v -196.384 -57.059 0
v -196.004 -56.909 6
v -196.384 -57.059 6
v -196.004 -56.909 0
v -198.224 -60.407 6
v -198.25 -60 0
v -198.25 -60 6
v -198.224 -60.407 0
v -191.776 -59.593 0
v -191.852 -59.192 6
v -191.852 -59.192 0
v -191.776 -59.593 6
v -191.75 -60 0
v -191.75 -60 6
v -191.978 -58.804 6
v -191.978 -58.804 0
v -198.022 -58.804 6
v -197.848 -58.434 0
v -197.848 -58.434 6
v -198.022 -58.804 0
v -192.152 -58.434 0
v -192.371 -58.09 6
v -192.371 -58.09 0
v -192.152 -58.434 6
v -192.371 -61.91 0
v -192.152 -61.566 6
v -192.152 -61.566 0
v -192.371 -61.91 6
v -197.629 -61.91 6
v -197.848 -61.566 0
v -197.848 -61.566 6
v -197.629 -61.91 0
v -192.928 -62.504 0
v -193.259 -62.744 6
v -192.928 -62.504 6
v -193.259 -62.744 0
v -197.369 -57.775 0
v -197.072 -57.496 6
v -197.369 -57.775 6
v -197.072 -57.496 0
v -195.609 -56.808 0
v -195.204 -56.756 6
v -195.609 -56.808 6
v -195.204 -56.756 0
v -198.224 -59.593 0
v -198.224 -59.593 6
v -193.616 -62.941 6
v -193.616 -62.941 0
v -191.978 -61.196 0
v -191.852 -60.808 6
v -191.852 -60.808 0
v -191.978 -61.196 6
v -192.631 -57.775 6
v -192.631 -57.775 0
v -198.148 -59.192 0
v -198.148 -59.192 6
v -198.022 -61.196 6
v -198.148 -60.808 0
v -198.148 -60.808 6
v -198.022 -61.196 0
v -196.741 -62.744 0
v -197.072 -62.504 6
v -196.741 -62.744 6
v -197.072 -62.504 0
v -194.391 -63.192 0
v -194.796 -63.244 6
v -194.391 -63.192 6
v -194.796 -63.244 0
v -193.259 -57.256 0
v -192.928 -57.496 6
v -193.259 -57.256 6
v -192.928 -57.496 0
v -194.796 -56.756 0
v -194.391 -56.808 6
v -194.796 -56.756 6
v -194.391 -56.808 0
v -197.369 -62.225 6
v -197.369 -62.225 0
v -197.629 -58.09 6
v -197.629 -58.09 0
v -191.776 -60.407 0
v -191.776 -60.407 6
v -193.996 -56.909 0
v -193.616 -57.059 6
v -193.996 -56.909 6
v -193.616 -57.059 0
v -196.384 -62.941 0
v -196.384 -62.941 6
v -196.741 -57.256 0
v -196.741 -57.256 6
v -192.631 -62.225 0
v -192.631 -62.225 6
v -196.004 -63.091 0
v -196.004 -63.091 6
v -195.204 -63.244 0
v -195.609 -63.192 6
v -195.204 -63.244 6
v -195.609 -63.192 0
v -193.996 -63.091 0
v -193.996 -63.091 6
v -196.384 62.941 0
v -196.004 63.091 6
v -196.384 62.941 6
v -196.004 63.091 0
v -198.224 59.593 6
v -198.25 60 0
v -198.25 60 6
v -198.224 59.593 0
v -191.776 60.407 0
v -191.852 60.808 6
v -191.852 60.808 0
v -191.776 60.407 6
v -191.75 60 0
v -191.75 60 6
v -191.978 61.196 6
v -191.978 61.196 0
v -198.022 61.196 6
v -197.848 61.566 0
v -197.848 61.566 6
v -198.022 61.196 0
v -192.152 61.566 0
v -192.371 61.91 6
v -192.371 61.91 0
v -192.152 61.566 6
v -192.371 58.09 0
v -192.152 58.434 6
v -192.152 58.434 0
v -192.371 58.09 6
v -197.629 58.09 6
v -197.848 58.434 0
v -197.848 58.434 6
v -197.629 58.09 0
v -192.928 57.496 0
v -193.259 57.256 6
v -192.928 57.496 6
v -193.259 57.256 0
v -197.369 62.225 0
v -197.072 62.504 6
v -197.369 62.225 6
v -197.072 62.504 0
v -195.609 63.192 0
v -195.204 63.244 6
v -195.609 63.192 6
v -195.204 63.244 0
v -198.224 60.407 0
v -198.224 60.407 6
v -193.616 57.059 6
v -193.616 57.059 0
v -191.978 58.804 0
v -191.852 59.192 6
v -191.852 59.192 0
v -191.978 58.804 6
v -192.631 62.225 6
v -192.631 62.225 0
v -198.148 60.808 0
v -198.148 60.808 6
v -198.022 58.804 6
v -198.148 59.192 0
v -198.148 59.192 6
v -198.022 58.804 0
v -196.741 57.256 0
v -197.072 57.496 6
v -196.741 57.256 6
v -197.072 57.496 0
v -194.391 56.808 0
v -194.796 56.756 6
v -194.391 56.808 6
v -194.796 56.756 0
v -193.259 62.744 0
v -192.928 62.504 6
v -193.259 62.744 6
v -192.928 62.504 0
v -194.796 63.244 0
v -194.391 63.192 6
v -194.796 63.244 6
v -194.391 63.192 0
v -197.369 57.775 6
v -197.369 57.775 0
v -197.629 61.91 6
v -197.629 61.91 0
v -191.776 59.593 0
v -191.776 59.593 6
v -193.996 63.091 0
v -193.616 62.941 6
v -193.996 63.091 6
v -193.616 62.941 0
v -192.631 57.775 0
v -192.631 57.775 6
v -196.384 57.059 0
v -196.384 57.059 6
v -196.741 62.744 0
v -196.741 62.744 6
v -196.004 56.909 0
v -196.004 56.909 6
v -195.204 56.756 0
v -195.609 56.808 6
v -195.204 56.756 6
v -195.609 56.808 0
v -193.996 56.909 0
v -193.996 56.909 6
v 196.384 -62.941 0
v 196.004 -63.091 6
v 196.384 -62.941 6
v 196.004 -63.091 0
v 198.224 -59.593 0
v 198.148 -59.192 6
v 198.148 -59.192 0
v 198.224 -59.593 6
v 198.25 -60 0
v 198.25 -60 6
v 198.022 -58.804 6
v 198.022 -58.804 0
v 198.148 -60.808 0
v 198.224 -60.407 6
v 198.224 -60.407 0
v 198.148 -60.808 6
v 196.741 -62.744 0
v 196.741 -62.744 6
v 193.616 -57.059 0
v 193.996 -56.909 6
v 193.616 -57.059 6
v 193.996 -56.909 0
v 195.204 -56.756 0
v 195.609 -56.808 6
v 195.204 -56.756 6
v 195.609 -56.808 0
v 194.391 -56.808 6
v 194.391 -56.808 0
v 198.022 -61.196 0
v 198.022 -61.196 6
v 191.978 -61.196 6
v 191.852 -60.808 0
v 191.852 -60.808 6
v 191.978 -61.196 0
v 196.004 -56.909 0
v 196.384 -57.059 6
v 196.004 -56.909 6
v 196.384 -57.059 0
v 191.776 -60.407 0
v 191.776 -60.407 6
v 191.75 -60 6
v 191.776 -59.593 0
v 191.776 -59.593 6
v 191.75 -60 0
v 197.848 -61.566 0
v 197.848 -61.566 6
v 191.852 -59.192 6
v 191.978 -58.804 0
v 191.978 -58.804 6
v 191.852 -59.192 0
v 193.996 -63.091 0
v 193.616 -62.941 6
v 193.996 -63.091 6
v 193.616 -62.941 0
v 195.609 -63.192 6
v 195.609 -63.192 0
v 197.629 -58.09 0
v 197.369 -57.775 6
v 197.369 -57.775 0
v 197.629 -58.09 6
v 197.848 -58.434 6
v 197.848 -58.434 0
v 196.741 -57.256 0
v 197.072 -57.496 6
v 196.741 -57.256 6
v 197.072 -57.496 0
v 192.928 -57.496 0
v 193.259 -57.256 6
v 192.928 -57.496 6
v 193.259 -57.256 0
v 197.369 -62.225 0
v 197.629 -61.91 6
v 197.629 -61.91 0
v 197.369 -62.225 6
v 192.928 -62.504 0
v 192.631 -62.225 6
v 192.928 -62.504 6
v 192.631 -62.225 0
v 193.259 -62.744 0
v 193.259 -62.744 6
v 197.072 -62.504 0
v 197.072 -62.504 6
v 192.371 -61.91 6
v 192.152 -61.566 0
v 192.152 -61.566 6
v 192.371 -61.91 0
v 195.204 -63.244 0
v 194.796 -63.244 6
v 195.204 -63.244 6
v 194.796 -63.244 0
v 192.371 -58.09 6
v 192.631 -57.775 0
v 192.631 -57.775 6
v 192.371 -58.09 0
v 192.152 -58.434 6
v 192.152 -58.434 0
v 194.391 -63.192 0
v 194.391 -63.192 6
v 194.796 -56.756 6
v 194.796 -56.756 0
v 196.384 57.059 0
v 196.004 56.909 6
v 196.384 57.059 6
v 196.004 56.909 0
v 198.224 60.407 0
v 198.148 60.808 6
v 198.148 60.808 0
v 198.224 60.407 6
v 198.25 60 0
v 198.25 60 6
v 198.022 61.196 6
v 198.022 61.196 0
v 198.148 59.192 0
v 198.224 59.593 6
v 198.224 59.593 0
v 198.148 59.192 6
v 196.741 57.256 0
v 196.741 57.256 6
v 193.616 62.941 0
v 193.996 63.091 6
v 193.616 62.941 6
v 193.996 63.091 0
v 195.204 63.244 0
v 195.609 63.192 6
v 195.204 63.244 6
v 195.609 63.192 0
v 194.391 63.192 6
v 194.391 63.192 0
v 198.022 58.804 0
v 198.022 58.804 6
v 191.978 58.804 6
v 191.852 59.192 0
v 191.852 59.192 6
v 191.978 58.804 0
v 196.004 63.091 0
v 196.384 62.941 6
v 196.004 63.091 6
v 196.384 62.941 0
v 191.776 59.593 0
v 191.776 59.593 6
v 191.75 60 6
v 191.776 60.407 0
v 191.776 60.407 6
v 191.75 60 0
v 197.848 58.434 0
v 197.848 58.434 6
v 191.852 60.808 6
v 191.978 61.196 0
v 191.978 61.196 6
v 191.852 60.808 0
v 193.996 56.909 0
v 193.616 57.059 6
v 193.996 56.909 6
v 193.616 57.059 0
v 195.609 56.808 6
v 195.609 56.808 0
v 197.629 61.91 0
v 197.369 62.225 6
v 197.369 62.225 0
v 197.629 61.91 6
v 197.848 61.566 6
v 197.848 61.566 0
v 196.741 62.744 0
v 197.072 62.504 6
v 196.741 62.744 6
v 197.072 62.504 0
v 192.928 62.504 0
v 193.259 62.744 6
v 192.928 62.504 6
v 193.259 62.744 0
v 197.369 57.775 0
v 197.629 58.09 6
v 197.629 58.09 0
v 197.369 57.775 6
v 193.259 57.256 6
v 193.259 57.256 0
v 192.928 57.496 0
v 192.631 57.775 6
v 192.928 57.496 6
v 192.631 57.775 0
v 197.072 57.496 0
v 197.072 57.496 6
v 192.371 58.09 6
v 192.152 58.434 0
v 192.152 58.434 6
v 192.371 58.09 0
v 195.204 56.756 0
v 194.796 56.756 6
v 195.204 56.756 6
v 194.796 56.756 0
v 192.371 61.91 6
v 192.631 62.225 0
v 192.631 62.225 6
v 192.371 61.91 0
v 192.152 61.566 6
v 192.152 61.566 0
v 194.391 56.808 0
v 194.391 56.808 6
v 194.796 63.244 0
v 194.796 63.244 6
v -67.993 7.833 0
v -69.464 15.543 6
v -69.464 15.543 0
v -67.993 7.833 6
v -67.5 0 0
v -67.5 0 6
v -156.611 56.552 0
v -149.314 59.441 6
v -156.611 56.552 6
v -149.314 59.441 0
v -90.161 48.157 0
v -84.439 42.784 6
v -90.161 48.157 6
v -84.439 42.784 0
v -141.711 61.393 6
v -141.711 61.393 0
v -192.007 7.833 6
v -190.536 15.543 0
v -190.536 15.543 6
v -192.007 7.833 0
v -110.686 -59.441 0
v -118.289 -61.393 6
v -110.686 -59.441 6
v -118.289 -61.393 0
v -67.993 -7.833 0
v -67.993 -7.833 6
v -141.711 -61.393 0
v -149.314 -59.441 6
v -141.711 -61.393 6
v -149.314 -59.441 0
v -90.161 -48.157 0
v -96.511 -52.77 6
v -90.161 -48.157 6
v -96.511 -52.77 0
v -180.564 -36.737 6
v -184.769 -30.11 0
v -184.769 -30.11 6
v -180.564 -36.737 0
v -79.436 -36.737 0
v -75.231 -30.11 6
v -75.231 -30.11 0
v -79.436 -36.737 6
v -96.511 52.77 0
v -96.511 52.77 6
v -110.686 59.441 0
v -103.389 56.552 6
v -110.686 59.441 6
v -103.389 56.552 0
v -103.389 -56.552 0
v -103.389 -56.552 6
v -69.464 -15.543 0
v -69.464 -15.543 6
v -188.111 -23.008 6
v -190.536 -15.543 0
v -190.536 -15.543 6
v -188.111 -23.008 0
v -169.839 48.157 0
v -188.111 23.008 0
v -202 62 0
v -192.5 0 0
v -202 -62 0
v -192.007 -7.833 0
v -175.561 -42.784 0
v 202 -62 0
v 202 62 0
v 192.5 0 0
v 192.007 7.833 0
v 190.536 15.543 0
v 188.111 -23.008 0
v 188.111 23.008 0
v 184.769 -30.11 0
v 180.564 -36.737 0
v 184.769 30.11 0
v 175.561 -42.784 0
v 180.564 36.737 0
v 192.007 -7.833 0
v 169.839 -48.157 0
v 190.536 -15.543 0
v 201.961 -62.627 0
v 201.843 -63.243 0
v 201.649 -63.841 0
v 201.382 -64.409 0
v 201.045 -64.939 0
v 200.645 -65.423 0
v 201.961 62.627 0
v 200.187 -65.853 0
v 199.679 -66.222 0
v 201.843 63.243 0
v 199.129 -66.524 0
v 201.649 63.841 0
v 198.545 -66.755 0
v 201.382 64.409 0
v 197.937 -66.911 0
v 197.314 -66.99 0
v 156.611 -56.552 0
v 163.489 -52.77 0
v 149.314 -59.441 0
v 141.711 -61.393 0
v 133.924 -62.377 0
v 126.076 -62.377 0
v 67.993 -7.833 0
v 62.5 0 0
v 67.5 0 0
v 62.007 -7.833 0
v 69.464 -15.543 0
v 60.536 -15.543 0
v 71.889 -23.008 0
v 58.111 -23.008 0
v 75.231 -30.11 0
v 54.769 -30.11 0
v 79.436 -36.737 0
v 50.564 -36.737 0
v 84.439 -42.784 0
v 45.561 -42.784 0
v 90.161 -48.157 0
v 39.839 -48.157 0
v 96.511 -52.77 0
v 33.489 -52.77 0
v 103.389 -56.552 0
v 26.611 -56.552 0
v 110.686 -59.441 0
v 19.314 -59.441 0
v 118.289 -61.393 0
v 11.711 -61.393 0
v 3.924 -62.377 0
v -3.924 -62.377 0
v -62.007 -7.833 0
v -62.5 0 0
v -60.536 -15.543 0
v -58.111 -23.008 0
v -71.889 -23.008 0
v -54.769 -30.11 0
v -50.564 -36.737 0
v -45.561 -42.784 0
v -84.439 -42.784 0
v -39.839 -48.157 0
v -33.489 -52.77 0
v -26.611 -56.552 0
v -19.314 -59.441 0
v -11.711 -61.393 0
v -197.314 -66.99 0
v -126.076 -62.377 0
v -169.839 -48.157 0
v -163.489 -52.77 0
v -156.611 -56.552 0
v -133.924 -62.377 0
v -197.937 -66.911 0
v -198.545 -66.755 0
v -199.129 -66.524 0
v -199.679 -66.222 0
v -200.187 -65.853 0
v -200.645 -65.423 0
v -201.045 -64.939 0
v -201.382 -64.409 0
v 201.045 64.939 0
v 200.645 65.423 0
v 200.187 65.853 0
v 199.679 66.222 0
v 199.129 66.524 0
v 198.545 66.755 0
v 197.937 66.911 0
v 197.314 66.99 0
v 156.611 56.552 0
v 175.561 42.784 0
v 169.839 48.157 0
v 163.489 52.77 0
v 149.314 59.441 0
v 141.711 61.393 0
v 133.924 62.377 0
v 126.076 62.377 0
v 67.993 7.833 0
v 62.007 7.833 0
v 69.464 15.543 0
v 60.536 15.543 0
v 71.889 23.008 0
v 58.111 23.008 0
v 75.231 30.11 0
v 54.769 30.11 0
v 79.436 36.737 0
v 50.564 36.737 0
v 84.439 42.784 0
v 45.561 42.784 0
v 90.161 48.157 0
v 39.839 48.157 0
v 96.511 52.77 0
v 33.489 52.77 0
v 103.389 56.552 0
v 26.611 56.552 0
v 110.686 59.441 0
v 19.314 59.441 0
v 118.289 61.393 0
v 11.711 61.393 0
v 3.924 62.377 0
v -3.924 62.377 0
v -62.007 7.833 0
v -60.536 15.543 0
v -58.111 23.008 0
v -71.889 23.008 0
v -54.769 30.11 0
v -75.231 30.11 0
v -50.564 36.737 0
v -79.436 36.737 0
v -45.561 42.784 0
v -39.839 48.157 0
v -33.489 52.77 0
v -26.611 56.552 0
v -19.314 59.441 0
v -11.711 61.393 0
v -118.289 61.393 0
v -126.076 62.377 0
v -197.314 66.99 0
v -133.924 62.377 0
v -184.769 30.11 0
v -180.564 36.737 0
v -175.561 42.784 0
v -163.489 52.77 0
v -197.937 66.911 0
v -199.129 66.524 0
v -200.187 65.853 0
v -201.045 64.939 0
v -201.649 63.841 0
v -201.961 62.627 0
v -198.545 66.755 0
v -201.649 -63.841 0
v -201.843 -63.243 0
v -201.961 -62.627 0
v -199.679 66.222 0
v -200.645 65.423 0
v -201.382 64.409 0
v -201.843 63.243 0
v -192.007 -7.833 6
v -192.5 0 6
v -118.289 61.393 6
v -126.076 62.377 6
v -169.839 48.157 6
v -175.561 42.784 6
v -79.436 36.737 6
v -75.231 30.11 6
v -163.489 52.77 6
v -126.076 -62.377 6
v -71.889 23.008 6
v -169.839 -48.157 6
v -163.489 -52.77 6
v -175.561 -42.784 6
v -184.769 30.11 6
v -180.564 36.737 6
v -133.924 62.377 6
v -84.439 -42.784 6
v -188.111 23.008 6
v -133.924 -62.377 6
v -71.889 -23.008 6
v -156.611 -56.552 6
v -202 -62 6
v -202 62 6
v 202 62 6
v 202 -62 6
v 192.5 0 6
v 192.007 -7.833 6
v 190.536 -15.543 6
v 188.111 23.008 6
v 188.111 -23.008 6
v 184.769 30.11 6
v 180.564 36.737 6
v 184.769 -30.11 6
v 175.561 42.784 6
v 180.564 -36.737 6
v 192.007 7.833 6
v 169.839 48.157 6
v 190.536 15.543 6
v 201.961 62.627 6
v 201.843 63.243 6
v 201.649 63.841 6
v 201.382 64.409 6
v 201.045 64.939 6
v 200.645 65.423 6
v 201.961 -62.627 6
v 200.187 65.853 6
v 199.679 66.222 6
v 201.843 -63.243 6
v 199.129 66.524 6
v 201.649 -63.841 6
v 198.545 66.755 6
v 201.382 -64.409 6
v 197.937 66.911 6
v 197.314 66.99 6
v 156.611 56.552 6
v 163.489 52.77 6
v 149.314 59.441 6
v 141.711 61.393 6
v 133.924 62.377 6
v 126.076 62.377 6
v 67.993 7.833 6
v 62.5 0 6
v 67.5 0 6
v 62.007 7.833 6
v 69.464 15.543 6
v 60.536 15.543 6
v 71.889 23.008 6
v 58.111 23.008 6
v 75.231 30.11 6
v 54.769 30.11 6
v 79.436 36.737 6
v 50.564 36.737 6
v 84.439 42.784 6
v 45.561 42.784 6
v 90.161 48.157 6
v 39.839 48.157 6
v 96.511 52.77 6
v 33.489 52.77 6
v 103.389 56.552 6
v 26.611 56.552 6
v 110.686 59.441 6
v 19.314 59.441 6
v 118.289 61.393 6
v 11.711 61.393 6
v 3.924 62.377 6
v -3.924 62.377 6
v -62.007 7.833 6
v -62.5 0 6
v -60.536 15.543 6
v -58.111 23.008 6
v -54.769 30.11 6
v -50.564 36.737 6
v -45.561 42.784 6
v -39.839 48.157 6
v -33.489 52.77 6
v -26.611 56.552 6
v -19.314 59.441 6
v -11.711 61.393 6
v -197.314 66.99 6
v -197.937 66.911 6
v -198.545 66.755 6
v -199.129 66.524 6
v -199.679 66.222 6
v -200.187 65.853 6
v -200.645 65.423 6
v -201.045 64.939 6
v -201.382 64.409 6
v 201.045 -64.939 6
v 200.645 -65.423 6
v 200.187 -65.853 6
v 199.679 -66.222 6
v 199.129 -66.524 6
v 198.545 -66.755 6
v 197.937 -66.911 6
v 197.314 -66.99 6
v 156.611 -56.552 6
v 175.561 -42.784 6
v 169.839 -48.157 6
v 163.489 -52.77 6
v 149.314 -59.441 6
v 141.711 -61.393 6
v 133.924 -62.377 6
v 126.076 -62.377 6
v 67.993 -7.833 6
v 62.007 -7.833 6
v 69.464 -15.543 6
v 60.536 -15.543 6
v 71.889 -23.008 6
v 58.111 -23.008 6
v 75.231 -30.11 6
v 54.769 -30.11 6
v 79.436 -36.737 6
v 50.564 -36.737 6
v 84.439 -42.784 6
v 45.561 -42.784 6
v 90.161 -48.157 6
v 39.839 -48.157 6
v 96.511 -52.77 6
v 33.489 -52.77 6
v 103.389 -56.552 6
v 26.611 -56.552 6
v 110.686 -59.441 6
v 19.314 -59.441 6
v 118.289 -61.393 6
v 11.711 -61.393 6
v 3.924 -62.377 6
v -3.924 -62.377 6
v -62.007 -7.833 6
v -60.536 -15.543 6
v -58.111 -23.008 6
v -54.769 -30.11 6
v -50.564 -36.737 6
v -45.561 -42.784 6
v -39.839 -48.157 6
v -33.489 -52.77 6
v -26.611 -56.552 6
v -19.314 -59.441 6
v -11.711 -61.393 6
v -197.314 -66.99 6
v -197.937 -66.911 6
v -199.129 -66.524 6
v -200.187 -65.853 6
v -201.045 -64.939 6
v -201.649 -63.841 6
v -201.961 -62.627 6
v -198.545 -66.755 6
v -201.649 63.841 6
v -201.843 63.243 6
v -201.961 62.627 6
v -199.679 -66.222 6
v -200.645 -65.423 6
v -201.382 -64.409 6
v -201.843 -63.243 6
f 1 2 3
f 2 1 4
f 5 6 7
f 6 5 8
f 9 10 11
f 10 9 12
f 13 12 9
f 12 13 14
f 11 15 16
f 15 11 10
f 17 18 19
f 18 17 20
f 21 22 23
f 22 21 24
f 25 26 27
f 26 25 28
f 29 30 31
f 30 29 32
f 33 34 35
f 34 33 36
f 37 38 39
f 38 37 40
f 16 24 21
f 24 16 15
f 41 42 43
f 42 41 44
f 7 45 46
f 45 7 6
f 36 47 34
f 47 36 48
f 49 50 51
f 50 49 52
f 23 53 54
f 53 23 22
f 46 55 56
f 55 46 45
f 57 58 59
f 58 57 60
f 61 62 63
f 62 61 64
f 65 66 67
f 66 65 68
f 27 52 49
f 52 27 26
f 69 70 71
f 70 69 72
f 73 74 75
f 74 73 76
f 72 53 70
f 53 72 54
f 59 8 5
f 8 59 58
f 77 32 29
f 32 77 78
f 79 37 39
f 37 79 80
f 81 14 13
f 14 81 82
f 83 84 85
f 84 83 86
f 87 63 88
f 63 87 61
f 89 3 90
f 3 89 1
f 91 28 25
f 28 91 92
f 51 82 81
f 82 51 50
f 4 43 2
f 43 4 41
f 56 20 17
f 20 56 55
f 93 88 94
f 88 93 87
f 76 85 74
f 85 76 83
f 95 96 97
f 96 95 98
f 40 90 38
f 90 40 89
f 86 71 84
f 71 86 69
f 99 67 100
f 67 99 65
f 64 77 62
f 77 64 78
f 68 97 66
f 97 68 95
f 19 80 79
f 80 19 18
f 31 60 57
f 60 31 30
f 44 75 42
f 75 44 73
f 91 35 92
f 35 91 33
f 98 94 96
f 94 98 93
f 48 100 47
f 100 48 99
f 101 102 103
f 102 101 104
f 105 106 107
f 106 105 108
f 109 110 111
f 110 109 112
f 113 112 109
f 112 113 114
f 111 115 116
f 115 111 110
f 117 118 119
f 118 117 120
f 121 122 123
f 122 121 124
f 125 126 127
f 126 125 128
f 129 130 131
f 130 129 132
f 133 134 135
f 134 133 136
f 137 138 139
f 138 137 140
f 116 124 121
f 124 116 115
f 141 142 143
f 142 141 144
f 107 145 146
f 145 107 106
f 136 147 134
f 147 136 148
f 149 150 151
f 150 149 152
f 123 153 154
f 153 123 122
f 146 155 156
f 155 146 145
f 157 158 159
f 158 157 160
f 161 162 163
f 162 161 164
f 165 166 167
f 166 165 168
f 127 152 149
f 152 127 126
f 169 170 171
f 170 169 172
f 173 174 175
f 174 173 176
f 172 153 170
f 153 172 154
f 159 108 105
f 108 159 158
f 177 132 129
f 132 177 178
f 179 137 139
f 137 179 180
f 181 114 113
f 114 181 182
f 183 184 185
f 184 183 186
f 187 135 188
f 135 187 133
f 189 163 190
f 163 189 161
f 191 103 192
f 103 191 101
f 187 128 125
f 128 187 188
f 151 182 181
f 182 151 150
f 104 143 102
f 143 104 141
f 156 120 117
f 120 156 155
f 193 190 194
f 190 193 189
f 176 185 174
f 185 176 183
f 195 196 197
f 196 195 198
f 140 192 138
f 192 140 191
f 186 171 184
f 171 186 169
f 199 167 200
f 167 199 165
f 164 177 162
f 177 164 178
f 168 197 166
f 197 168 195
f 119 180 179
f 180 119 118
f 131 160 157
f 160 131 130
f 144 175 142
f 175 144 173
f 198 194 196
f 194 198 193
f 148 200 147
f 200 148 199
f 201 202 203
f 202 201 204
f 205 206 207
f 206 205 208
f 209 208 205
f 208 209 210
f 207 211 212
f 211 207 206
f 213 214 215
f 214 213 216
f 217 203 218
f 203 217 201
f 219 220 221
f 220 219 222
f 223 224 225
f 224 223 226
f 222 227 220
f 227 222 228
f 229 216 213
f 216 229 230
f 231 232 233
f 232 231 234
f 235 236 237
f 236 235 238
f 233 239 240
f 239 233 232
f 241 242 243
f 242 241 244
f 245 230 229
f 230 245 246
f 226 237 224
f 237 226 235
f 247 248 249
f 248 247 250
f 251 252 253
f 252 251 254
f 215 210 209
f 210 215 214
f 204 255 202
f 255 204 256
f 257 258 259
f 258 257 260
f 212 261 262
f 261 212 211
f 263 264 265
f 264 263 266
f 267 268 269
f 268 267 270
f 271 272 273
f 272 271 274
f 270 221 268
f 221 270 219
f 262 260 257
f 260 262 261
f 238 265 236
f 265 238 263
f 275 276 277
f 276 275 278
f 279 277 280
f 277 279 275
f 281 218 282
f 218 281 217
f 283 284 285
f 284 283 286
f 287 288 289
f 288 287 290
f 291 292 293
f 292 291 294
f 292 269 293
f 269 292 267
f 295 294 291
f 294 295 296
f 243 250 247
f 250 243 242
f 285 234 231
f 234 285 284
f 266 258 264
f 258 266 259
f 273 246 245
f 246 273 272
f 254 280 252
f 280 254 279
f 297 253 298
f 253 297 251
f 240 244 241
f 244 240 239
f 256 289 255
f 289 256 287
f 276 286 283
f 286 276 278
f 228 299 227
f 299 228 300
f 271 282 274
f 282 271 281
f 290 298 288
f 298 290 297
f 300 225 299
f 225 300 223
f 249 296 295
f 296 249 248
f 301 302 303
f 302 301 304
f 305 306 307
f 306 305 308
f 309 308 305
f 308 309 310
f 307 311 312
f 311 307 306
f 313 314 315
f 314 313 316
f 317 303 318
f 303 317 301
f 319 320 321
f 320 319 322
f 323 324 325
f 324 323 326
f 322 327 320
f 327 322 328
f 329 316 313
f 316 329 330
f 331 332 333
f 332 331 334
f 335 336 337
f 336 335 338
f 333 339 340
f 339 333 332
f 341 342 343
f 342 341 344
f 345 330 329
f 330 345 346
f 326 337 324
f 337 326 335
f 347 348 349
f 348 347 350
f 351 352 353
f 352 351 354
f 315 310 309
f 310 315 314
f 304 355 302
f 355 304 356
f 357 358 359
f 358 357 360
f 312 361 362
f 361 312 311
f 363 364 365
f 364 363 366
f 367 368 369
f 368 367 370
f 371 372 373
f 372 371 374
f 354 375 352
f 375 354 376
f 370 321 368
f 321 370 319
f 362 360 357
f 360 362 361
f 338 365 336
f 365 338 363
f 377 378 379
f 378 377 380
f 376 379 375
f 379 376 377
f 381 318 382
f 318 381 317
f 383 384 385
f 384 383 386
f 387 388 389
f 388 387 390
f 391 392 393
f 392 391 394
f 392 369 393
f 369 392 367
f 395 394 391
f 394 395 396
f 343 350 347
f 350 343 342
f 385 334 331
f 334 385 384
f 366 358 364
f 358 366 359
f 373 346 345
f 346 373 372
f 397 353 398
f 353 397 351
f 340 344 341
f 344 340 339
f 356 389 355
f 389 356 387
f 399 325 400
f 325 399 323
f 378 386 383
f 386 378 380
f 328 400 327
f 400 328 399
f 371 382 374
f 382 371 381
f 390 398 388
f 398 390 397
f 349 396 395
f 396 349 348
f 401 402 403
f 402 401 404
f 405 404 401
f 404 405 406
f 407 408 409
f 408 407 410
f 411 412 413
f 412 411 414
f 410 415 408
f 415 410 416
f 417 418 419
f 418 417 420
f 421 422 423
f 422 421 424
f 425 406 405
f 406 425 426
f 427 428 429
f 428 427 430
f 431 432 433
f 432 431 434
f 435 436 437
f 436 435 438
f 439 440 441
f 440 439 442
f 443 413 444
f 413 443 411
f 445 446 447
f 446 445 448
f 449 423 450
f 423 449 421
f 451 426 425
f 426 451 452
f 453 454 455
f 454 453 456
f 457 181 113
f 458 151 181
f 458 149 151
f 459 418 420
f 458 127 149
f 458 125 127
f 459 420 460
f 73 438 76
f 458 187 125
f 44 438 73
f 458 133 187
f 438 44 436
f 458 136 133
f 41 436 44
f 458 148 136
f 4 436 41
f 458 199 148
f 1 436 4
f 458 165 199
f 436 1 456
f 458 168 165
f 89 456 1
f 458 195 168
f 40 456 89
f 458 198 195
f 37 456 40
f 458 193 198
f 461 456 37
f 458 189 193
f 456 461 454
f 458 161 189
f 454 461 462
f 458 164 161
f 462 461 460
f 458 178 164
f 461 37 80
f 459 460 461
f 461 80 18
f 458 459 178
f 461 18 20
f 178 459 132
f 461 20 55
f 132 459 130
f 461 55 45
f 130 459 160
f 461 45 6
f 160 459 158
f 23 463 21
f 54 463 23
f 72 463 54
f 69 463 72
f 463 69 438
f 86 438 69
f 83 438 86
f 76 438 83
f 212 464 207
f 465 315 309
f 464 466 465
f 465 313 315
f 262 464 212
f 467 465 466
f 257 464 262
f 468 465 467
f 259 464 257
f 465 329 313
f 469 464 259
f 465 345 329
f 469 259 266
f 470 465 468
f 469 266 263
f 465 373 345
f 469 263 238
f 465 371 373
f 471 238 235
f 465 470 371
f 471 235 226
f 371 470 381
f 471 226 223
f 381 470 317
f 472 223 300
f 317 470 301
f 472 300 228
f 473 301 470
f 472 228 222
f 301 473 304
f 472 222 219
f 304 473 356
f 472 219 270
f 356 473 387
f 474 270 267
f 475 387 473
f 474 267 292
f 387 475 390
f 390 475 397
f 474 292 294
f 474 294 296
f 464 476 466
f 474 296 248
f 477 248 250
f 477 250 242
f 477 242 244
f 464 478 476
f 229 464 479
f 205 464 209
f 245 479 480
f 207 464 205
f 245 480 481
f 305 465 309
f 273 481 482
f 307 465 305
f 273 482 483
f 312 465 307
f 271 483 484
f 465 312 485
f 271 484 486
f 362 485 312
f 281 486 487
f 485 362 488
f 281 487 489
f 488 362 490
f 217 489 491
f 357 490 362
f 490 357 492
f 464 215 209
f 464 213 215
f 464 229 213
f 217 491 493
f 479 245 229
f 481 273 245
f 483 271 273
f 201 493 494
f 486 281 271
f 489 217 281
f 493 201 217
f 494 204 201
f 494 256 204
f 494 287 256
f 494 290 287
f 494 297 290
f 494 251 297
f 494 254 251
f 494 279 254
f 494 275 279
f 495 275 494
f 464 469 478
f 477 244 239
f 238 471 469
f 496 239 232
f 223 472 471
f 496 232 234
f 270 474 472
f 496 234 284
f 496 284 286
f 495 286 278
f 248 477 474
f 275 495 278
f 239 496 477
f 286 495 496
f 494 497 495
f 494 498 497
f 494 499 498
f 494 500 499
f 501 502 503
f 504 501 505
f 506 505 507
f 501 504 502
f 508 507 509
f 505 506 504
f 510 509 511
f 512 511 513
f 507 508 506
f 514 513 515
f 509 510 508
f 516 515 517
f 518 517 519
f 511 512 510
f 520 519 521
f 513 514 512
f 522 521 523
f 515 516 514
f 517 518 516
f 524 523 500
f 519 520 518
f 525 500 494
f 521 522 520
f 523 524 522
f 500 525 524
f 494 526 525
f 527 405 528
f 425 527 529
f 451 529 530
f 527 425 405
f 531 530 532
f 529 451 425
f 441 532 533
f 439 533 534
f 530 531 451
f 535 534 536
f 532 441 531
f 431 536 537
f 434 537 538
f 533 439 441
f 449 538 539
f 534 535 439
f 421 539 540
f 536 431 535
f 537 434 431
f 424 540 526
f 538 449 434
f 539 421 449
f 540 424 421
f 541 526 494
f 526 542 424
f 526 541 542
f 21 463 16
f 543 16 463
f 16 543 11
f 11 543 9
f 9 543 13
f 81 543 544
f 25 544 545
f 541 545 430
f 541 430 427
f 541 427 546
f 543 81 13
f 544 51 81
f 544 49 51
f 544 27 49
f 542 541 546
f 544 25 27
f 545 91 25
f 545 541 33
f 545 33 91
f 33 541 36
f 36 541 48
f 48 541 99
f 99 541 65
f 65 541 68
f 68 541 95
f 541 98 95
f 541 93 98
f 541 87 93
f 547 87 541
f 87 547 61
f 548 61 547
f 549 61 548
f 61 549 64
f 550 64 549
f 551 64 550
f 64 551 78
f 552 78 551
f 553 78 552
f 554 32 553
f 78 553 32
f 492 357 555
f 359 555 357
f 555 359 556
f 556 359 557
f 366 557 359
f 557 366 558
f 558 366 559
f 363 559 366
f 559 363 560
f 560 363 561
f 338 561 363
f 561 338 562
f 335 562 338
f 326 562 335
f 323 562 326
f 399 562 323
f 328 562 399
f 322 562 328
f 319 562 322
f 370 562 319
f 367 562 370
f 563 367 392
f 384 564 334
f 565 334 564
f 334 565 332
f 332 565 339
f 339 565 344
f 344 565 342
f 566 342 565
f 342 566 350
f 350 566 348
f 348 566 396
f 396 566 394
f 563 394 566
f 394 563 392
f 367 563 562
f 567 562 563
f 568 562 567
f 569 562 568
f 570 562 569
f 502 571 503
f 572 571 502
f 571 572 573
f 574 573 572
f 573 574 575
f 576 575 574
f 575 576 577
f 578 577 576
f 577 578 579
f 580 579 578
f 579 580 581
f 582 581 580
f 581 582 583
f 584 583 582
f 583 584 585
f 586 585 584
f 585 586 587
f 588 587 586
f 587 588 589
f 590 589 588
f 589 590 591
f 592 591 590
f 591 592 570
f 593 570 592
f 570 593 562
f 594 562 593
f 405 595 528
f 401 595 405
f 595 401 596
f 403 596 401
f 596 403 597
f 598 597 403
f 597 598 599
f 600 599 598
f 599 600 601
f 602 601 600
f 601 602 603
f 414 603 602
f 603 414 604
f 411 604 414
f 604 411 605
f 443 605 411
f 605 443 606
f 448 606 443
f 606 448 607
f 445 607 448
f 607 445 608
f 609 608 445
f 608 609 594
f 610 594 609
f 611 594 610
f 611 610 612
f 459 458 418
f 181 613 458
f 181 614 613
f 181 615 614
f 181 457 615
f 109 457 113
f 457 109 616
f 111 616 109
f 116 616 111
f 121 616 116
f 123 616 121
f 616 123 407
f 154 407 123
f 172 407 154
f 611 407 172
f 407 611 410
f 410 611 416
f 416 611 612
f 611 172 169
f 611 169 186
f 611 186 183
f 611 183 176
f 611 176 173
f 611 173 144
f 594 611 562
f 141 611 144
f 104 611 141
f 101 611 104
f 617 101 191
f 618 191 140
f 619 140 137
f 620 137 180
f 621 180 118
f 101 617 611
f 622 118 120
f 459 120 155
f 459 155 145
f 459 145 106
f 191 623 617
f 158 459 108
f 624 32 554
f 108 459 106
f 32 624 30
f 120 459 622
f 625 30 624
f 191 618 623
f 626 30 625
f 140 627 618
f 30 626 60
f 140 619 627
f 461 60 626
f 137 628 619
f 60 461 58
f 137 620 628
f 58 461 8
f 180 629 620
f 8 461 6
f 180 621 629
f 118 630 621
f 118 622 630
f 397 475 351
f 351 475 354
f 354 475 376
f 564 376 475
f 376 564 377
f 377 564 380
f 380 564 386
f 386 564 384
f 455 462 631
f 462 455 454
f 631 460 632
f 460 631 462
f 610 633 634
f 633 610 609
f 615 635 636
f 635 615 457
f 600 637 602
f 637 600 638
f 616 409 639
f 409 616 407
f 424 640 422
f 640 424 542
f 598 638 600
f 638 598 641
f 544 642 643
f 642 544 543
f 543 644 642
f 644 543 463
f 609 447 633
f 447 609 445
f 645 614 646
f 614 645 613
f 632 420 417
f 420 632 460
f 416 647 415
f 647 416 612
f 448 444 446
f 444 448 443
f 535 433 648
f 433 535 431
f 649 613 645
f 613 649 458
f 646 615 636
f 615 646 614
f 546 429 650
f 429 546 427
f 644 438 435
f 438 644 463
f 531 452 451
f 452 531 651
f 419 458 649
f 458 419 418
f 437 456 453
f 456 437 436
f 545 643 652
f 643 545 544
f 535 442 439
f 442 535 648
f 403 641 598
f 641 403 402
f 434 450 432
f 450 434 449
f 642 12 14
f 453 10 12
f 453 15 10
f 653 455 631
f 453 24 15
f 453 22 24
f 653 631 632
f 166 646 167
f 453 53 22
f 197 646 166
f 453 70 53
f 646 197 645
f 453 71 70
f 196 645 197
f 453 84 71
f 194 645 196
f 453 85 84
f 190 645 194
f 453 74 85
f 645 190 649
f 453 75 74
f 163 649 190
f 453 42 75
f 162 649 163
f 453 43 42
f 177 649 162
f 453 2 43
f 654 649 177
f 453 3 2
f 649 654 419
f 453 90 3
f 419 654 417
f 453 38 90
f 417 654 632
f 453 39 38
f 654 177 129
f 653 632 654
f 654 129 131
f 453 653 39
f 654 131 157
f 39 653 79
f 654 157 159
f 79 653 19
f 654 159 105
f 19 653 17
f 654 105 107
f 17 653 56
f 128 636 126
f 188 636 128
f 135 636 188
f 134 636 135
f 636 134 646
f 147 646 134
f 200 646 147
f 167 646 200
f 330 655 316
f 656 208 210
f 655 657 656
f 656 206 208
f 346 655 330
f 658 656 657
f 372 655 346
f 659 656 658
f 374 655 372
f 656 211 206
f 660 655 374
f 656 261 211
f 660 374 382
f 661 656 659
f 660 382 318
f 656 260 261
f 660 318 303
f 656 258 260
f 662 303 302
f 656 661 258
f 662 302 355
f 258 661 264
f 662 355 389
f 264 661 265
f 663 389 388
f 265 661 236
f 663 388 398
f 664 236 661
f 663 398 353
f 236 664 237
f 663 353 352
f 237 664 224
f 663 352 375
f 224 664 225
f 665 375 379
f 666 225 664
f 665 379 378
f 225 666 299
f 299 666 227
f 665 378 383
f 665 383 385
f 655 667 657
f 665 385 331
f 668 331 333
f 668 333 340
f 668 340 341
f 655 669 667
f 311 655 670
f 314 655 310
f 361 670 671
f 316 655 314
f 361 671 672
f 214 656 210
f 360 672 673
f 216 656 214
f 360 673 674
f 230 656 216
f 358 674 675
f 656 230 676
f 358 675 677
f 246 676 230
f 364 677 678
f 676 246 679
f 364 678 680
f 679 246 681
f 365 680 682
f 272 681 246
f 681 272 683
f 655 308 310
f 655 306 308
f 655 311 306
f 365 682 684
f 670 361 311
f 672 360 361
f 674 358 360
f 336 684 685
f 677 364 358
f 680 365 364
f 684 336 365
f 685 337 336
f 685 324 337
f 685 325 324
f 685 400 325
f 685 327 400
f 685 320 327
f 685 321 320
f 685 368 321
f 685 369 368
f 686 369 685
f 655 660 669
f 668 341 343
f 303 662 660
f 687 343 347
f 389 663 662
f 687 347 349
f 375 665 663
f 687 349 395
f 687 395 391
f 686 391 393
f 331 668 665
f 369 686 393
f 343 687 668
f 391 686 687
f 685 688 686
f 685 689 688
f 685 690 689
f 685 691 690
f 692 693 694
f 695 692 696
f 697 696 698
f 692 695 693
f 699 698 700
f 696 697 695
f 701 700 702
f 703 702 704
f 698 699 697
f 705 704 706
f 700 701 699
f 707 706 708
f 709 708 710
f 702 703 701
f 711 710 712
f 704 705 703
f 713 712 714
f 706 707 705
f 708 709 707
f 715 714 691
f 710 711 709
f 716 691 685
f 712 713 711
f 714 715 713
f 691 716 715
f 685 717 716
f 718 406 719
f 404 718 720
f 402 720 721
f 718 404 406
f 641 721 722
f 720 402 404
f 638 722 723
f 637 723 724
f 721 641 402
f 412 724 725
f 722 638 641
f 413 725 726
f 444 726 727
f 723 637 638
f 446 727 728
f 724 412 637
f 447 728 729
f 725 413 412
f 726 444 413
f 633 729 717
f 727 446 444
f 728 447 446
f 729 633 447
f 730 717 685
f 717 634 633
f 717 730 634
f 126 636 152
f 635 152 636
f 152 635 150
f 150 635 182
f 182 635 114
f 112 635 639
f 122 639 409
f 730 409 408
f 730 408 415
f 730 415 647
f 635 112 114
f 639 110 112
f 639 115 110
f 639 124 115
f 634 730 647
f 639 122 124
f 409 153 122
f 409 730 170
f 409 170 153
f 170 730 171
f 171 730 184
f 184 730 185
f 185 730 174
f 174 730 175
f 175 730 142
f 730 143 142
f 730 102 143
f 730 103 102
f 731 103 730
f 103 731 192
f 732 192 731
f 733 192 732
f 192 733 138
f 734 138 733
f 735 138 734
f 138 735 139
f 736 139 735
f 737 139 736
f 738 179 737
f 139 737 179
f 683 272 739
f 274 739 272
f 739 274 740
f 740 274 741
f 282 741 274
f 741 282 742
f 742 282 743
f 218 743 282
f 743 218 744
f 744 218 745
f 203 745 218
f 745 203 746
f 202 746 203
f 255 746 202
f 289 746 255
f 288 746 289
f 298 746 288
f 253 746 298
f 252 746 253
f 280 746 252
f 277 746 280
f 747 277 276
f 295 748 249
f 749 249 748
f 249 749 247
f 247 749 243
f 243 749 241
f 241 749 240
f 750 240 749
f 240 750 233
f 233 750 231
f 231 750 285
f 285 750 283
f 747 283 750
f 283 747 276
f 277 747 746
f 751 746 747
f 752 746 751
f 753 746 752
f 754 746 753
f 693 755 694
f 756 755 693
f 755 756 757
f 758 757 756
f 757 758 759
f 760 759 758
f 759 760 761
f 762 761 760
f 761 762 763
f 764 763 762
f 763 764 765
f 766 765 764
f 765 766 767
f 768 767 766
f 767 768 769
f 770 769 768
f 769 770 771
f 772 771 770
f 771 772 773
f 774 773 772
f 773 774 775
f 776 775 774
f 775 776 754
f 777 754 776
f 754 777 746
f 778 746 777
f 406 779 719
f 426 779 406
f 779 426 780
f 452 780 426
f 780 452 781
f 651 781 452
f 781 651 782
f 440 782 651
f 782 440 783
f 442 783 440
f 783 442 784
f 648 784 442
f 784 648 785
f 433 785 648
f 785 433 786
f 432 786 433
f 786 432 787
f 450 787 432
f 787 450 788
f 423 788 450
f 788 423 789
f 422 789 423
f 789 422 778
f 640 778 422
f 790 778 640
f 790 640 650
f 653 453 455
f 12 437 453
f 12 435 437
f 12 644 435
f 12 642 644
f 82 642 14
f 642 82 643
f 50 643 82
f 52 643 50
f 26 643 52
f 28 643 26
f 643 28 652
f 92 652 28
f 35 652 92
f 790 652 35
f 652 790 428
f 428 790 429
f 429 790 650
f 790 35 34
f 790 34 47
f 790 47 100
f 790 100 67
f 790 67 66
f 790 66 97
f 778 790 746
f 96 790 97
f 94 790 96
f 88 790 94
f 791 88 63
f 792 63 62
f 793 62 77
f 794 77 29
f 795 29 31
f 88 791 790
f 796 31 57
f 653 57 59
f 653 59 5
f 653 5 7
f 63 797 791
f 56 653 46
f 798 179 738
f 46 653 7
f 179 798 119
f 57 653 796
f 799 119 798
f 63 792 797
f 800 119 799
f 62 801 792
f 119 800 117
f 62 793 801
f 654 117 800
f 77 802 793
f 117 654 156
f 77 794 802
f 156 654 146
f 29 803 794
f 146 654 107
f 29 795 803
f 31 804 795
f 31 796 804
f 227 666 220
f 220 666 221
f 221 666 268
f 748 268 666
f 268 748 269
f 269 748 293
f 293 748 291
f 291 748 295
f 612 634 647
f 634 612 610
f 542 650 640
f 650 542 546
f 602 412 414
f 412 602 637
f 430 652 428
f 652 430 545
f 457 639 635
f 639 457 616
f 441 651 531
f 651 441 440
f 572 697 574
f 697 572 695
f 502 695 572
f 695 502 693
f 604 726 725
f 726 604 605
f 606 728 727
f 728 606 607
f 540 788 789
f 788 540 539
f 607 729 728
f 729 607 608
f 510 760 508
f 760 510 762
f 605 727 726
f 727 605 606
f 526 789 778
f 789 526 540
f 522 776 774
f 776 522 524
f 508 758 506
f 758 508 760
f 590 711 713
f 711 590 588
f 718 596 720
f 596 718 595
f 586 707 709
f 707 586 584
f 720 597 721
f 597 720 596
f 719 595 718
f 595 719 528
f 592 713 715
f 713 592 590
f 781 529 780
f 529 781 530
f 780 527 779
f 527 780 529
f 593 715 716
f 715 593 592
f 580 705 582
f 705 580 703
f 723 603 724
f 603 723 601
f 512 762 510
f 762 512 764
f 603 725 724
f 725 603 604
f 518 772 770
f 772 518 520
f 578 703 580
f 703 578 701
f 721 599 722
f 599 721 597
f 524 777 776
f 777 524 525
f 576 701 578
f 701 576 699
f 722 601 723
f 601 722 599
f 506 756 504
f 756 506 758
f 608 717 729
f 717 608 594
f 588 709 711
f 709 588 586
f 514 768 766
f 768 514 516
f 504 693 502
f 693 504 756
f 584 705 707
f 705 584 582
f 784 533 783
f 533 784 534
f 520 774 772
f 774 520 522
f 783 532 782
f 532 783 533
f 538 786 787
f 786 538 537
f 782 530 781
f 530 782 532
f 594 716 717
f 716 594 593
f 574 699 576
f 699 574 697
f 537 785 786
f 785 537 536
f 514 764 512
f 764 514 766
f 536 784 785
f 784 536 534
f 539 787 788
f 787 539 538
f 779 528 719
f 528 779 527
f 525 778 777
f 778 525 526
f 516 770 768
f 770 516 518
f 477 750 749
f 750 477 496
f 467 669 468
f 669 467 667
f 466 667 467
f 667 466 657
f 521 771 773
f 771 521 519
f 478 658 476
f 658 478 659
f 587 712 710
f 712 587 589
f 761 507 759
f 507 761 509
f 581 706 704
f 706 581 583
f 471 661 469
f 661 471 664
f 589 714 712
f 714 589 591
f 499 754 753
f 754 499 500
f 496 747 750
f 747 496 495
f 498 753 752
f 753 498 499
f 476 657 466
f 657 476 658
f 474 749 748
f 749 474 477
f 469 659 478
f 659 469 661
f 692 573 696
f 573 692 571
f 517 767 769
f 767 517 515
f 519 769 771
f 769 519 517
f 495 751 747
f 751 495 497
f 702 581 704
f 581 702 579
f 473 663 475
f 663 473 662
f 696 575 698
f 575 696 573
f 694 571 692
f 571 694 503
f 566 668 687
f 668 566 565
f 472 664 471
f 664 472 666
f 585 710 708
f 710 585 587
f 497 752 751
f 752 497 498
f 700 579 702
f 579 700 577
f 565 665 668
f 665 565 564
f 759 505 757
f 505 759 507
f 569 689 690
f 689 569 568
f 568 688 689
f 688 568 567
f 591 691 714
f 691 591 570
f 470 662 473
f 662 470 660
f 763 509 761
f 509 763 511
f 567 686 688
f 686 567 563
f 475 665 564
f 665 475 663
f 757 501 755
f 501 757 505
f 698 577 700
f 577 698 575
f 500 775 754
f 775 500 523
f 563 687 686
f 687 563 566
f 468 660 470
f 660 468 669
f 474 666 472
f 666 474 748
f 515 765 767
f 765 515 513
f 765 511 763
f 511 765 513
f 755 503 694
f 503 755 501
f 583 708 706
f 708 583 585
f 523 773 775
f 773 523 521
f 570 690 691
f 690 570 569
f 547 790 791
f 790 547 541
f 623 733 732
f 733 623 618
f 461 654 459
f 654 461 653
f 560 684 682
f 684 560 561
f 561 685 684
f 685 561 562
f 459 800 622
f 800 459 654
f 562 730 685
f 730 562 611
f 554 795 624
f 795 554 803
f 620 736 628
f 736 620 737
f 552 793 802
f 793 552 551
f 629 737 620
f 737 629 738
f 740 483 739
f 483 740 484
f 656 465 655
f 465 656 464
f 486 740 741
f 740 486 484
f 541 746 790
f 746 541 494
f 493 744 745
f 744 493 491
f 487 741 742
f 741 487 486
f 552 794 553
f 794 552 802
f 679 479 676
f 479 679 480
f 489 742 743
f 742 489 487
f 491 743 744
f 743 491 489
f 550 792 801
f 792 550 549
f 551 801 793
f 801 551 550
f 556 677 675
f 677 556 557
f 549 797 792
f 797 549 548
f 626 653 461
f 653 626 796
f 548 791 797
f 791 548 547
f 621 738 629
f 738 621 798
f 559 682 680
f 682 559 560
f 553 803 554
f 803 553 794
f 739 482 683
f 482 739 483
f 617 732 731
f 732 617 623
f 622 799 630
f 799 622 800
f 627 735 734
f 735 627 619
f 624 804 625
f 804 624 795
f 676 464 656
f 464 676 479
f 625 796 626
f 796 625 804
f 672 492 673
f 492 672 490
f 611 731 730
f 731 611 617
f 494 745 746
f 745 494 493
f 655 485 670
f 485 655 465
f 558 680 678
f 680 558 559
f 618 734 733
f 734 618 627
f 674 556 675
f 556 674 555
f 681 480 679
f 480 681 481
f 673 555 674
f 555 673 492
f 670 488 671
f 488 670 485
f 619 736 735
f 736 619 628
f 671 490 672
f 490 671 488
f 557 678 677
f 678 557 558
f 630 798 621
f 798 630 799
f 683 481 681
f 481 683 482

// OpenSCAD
$fn = 50;


difference() {
	union() {
		hull() {
			translate(v = [-197.0000000000, 62.0000000000, 0]) {
				cylinder(h = 6, r = 5);
			}
			translate(v = [197.0000000000, 62.0000000000, 0]) {
				cylinder(h = 6, r = 5);
			}
			translate(v = [-197.0000000000, -62.0000000000, 0]) {
				cylinder(h = 6, r = 5);
			}
			translate(v = [197.0000000000, -62.0000000000, 0]) {
				cylinder(h = 6, r = 5);
			}
		}
	}
	union() {
		#translate(v = [-195.0000000000, -60.0000000000, -100.0000000000]) {
			cylinder(h = 200, r = 3.2500000000);
		}
		#translate(v = [-195.0000000000, 60.0000000000, -100.0000000000]) {
			cylinder(h = 200, r = 3.2500000000);
		}
		#translate(v = [195.0000000000, -60.0000000000, -100.0000000000]) {
			cylinder(h = 200, r = 3.2500000000);
		}
		#translate(v = [195.0000000000, 60.0000000000, -100.0000000000]) {
			cylinder(h = 200, r = 3.2500000000);
		}
		#translate(v = [-130.0000000000, 0, 0]) {
			cylinder(h = 6, r = 62.5000000000);
		}
		#cylinder(h = 6, r = 62.5000000000);
		#translate(v = [130.0000000000, 0, 0]) {
			cylinder(h = 6, r = 62.5000000000);
		}
	}
}
